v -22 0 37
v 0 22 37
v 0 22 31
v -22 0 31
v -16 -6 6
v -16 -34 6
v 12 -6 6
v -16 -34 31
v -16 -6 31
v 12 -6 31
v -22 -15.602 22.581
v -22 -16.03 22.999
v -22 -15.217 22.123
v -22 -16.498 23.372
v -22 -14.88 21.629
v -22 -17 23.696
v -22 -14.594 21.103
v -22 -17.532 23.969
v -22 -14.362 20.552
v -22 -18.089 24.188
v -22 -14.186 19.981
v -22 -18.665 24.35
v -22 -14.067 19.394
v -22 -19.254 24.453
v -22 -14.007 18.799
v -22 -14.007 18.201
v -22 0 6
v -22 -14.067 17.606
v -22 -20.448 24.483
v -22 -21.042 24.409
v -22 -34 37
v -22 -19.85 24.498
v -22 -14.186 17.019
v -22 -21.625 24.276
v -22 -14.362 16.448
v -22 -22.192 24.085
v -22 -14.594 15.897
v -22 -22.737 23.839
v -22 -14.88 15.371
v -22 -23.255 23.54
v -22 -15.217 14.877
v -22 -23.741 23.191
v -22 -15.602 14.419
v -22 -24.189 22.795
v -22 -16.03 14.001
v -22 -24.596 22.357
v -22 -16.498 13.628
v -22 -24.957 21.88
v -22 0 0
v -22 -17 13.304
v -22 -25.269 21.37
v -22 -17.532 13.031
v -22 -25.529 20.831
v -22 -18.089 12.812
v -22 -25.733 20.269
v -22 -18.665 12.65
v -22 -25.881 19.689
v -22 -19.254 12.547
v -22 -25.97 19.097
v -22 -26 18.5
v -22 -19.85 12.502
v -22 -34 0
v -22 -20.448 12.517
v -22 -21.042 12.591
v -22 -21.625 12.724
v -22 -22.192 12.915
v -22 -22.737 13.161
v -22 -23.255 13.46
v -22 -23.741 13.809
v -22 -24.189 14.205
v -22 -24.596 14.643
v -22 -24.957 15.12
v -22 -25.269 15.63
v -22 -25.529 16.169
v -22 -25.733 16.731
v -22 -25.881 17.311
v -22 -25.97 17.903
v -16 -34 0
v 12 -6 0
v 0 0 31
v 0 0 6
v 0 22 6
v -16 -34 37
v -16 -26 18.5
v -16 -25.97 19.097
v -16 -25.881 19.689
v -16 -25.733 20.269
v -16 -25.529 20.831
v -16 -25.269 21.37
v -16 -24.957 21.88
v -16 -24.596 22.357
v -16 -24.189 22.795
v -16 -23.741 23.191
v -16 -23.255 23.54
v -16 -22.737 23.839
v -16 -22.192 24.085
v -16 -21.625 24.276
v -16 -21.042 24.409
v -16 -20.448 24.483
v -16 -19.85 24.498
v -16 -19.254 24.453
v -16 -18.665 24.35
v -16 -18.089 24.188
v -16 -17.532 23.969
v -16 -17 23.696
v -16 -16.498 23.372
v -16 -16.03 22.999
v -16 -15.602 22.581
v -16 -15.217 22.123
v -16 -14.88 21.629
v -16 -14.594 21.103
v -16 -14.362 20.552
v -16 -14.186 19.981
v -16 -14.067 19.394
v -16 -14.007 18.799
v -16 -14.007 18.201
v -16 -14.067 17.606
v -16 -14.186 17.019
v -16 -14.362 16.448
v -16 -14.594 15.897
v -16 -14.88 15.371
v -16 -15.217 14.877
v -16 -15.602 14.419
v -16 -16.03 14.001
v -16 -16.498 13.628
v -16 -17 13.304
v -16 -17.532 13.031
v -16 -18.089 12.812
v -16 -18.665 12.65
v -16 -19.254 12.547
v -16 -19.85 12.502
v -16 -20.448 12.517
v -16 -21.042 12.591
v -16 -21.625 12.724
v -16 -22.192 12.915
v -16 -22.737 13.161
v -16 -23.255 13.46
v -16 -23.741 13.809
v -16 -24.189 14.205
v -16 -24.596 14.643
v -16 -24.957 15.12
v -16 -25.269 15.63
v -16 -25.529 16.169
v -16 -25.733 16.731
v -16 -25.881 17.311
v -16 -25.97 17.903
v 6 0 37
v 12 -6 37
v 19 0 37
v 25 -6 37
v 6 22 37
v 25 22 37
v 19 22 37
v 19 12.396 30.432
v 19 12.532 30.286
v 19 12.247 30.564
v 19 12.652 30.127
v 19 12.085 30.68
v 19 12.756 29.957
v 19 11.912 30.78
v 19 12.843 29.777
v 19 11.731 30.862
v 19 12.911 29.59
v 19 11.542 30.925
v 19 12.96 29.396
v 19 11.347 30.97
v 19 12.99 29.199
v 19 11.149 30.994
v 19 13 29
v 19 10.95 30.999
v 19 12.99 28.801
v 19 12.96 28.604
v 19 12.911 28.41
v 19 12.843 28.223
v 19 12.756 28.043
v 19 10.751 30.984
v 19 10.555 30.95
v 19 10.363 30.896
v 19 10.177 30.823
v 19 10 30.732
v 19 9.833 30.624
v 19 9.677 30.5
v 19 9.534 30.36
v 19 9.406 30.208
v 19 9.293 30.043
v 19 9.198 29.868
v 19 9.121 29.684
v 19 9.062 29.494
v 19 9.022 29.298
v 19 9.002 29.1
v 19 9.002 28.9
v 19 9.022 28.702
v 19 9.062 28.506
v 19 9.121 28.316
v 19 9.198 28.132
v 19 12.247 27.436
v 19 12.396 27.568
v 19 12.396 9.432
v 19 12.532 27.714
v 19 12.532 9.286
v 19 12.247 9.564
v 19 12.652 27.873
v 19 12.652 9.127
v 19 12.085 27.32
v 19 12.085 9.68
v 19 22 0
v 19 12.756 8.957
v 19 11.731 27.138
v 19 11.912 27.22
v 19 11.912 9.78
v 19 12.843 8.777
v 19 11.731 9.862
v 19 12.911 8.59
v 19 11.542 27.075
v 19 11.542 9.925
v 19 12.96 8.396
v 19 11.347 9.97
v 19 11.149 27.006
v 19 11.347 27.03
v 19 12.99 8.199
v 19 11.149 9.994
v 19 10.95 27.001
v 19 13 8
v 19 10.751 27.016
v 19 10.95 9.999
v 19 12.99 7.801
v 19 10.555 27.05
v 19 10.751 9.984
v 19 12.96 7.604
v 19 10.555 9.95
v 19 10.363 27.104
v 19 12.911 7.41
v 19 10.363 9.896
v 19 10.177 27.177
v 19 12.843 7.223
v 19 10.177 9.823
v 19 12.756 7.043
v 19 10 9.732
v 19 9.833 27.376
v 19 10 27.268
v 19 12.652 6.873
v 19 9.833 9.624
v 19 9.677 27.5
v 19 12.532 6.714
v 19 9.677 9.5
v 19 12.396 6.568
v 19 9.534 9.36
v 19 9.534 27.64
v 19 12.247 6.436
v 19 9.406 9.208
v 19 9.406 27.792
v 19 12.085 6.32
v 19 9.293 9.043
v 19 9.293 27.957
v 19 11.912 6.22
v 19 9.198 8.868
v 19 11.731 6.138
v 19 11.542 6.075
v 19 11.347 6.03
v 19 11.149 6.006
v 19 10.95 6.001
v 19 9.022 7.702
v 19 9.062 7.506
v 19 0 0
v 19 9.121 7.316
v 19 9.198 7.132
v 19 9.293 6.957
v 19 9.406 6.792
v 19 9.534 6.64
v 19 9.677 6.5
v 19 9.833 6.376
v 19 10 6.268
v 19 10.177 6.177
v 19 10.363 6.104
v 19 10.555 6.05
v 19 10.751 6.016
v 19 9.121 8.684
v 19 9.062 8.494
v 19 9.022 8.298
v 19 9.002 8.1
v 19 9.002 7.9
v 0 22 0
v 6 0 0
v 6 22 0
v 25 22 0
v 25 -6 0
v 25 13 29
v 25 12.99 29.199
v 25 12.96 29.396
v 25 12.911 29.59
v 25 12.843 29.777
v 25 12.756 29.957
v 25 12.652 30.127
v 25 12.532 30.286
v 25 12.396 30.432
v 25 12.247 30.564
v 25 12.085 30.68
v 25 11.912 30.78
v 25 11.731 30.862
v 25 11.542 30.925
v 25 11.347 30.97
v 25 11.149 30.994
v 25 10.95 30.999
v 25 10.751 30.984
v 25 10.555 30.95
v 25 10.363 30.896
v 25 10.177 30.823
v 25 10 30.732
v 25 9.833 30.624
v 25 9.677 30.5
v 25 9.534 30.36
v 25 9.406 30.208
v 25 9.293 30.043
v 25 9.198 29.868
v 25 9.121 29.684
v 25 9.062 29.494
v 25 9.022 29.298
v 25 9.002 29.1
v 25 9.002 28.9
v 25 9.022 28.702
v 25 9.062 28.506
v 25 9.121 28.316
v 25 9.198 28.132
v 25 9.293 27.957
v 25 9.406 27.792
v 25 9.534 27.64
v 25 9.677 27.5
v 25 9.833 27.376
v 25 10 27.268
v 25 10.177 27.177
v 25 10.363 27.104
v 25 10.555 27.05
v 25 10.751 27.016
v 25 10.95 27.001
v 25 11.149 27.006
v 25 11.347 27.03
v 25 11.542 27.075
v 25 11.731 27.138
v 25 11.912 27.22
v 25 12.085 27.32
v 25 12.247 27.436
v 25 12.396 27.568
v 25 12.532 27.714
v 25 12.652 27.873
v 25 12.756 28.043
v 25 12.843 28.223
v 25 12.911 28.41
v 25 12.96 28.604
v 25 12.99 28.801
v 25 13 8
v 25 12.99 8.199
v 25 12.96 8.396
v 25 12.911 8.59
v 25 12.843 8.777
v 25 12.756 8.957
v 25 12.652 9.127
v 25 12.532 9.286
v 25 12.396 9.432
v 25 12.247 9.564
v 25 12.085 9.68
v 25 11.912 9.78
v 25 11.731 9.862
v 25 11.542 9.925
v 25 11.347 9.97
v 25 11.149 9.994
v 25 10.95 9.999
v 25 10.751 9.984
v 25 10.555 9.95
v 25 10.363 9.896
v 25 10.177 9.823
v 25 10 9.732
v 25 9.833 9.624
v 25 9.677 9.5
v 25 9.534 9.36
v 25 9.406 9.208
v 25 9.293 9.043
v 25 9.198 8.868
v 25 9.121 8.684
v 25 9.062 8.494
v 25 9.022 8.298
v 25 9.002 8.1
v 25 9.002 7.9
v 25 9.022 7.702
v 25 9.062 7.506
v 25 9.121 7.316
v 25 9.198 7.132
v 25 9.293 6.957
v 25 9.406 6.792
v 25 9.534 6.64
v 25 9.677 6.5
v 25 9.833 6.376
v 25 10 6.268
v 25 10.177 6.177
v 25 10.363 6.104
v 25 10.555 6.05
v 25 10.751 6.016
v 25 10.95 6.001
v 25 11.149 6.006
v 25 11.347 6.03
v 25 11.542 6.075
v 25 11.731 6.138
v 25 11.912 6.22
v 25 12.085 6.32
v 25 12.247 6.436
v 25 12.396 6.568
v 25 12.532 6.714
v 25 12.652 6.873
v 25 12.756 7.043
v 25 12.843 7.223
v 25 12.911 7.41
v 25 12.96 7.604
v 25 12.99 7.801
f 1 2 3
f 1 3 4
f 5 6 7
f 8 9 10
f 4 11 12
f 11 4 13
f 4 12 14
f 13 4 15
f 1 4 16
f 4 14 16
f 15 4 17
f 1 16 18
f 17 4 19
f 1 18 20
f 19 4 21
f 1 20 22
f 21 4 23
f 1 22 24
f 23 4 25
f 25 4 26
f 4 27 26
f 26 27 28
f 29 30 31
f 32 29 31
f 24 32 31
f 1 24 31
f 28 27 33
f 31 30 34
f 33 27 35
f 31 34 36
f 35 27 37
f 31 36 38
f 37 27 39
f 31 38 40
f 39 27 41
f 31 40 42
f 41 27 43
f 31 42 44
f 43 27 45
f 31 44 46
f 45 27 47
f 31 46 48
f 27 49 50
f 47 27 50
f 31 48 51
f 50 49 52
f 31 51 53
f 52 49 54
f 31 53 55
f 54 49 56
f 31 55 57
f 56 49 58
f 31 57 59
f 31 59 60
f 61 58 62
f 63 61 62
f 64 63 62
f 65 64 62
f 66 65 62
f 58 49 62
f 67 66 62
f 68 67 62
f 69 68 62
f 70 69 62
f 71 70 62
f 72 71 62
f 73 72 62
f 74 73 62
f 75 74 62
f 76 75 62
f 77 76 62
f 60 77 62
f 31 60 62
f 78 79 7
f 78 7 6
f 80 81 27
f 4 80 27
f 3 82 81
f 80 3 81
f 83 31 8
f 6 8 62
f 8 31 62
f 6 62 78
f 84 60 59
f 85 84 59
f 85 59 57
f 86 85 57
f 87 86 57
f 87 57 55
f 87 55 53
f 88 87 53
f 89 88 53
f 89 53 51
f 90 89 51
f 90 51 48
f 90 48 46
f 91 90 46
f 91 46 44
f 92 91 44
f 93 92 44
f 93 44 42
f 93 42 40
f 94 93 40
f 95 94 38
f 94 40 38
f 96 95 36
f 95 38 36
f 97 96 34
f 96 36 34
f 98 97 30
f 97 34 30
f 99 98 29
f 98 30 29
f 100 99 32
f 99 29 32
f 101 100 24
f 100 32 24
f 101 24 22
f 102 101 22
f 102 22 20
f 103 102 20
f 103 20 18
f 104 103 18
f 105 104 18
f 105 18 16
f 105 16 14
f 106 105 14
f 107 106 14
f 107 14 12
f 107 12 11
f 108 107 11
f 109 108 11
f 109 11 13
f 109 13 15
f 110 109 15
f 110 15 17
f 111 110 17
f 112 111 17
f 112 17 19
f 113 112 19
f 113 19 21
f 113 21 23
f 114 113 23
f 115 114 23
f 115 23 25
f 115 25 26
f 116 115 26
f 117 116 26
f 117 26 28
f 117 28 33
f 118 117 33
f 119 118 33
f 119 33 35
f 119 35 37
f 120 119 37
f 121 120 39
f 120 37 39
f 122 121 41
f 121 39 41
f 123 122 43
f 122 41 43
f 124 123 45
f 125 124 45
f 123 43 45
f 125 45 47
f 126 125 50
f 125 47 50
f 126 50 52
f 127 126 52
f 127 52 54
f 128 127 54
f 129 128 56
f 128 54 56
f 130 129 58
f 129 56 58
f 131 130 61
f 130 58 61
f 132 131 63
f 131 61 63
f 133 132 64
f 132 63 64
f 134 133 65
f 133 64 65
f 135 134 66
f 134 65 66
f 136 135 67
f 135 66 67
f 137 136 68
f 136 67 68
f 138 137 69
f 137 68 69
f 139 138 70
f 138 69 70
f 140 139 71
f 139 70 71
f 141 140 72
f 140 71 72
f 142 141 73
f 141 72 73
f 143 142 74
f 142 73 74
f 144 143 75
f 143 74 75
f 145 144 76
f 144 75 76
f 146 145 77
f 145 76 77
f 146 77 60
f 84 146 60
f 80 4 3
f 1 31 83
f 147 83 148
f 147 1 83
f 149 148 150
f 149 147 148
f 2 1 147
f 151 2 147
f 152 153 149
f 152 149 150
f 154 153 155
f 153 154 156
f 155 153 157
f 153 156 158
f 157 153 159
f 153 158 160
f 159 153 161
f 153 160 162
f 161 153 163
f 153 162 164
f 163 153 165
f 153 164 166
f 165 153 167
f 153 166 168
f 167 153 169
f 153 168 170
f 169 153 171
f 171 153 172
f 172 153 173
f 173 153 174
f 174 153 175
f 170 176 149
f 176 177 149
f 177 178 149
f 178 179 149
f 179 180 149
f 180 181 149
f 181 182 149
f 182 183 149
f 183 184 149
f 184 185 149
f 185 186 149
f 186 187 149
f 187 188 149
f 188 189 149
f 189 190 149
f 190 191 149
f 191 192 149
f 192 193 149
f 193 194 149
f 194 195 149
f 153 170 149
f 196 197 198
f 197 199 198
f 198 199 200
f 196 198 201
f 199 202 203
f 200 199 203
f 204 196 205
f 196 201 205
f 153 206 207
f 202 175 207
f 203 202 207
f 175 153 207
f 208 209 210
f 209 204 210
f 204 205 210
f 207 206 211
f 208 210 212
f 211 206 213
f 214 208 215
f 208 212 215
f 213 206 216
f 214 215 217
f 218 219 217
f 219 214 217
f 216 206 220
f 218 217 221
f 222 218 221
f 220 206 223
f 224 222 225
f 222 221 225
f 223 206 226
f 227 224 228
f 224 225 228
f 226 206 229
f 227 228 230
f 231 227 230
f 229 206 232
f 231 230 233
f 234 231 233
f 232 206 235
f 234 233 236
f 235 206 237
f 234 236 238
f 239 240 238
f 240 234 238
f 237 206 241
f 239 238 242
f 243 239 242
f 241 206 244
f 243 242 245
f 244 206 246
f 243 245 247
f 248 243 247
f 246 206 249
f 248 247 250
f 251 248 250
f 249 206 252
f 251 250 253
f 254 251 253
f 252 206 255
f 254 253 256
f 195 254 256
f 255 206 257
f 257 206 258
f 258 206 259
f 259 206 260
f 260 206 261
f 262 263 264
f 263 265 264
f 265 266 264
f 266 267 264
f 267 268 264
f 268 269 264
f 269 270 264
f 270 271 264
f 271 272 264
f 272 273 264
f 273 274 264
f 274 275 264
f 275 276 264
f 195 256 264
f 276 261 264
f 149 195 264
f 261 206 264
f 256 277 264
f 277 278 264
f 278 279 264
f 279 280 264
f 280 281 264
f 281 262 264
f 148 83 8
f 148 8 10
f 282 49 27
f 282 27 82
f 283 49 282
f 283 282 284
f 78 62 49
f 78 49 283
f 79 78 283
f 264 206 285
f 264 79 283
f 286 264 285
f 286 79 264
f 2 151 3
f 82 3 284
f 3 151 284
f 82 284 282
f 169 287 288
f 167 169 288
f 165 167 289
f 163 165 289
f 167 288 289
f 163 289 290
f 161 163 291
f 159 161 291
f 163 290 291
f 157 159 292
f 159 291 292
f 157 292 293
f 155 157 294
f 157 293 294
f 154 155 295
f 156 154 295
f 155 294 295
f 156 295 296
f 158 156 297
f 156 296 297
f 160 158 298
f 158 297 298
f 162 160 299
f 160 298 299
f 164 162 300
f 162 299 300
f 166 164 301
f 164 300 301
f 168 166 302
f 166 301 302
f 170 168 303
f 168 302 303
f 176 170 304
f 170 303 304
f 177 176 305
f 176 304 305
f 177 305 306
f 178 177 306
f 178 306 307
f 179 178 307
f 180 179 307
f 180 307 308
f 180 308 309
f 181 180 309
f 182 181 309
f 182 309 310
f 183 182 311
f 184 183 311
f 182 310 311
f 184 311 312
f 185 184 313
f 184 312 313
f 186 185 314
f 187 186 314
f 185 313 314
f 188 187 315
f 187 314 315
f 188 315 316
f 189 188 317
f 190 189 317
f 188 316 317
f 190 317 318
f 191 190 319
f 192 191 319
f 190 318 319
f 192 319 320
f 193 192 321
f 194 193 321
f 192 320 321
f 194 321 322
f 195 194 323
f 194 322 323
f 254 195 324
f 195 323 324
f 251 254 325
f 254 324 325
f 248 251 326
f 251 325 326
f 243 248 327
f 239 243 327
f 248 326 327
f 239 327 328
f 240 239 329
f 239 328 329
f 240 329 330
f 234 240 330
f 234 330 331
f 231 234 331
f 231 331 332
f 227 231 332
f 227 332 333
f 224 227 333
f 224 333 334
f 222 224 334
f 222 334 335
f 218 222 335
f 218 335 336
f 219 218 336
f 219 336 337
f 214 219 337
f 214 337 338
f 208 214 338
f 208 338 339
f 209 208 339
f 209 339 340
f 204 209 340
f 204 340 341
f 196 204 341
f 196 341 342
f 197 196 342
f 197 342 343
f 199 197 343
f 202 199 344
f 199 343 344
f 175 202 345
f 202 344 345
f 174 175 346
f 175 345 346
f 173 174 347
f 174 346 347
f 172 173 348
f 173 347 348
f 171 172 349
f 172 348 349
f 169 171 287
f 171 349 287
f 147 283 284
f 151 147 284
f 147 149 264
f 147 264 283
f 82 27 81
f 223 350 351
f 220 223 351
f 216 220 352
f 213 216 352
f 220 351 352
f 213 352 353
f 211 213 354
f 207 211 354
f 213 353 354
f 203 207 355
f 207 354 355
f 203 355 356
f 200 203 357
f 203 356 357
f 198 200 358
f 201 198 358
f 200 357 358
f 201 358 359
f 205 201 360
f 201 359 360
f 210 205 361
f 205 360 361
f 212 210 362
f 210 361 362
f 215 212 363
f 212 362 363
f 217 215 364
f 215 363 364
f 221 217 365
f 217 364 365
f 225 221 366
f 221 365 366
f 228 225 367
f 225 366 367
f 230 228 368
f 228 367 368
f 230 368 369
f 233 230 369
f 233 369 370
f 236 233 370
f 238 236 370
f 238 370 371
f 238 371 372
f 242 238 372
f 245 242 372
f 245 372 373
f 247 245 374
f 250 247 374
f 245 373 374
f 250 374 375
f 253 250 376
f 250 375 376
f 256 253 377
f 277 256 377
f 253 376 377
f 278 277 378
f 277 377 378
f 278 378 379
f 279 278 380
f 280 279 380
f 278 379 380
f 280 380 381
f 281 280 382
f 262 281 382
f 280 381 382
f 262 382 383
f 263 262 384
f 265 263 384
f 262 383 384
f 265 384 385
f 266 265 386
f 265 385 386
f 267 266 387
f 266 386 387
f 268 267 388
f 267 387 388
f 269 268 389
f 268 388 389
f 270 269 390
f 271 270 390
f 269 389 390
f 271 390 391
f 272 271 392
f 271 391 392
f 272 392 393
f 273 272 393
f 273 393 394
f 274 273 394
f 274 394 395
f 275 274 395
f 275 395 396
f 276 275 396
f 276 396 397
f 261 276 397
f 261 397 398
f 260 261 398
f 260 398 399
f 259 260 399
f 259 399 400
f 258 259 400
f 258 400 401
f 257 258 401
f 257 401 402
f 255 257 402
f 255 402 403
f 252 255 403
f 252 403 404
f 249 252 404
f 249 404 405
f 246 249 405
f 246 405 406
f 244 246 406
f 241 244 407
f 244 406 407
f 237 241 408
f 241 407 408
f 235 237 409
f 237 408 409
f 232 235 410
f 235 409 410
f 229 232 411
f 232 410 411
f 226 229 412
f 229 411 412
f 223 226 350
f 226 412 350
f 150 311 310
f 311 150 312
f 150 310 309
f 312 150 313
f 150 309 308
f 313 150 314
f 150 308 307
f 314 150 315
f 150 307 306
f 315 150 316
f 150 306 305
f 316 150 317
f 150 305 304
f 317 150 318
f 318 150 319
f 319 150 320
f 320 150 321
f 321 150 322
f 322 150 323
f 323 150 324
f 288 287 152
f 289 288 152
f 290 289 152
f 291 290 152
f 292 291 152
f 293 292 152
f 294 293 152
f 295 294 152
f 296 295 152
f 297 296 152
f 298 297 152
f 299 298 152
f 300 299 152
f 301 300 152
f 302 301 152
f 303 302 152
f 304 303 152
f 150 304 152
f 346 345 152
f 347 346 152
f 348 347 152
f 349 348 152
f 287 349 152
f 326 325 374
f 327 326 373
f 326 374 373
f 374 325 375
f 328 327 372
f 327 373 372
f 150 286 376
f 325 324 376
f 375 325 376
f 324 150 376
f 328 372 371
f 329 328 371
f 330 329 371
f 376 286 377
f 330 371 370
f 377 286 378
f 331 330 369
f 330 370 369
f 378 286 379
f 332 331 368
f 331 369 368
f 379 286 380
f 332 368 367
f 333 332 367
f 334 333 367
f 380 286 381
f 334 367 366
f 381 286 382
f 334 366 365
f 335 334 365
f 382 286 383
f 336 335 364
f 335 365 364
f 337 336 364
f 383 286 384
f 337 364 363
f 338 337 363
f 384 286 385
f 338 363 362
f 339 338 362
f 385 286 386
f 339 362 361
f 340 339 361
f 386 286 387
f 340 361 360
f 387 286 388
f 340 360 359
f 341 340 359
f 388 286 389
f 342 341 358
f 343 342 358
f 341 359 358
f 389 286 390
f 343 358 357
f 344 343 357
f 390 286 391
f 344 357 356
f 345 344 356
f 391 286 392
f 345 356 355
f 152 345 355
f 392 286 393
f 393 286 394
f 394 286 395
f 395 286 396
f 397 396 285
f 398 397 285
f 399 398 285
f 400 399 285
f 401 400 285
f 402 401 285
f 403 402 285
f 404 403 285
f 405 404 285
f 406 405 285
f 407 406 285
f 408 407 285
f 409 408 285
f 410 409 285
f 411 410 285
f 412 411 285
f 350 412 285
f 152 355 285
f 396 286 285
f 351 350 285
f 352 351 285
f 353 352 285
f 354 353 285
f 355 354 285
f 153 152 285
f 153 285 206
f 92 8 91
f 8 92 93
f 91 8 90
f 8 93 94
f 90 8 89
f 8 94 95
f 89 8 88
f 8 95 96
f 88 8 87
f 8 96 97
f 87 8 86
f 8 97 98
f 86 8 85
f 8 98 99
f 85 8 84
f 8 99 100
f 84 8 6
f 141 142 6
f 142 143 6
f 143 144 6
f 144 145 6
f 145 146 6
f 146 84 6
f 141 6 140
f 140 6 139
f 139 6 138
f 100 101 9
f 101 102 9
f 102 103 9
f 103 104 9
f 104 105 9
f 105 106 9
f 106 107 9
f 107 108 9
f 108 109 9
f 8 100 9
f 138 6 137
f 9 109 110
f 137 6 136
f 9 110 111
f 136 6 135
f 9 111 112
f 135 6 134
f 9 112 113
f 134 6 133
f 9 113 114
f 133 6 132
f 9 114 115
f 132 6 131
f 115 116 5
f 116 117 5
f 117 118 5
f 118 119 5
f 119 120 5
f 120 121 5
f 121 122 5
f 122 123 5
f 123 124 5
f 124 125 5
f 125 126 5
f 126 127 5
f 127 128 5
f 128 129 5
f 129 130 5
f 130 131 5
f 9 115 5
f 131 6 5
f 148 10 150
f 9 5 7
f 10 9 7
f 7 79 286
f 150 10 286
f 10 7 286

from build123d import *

# Parameters (mm, degrees)
PAD_DEPTH       = 37
PAD001_DEPTH    = 6
PAD002_DEPTH    = 6
SKETCH003_R     = 6
POCKET_DEPTH    = 47.001
SKETCH004_R     = 2
POCKET001_DEPTH = 6


with BuildPart() as part:
    # Sketch → Pad (new body)
    with BuildSketch(Plane.XY):
        Polygon((0, 0), (-22, 0), (-22, -34), (-16, -34), (-16, -6), (25, -6), (25, 22), (19, 22), (19, 0), (6, 0), (6, 22), (0, 22), align=None)
    extrude(amount=PAD_DEPTH)

    # Sketch001 (on Face14 of Pad) → Pad001 (join)
    with BuildSketch(Plane.XY.offset(37)):
        Polygon((-16, -6), (-16, -34), (12, -6), (0, -6), (0, 0), (0, 22), (-22, 0), (-16, 0), align=None)
    extrude(amount=-PAD001_DEPTH)

    # Sketch002 (on Face2 of Pad001) → Pad002 (join)
    with BuildSketch(Plane(origin=(0, 0, 0), x_dir=(1, 0, 0), z_dir=(0, 0, -1))):
        Polygon((-16, 34), (-16, 0), (-22, 0), (0, -22), (0, 6), (12, 6), align=None)
    extrude(amount=-PAD002_DEPTH)

    # Sketch003 (on Face15 of Pad002) → Pocket (cut, through all)
    with BuildSketch(Plane(origin=(-22, 0, 0), x_dir=(0, -1, 0), z_dir=(-1, 0, 0))):
        with Locations((20, 18.5)):
            Circle(SKETCH003_R)
    extrude(amount=-POCKET_DEPTH, mode=Mode.SUBTRACT)

    # Sketch004 (on Face11 of Pocket) → Pocket001 (cut)
    with BuildSketch(Plane.YZ.offset(25)):
        with Locations((11, 29)):
            Circle(SKETCH004_R)
        with Locations((11, 8)):
            Circle(SKETCH004_R)
    extrude(amount=-POCKET001_DEPTH, mode=Mode.SUBTRACT)


solid = part.part
